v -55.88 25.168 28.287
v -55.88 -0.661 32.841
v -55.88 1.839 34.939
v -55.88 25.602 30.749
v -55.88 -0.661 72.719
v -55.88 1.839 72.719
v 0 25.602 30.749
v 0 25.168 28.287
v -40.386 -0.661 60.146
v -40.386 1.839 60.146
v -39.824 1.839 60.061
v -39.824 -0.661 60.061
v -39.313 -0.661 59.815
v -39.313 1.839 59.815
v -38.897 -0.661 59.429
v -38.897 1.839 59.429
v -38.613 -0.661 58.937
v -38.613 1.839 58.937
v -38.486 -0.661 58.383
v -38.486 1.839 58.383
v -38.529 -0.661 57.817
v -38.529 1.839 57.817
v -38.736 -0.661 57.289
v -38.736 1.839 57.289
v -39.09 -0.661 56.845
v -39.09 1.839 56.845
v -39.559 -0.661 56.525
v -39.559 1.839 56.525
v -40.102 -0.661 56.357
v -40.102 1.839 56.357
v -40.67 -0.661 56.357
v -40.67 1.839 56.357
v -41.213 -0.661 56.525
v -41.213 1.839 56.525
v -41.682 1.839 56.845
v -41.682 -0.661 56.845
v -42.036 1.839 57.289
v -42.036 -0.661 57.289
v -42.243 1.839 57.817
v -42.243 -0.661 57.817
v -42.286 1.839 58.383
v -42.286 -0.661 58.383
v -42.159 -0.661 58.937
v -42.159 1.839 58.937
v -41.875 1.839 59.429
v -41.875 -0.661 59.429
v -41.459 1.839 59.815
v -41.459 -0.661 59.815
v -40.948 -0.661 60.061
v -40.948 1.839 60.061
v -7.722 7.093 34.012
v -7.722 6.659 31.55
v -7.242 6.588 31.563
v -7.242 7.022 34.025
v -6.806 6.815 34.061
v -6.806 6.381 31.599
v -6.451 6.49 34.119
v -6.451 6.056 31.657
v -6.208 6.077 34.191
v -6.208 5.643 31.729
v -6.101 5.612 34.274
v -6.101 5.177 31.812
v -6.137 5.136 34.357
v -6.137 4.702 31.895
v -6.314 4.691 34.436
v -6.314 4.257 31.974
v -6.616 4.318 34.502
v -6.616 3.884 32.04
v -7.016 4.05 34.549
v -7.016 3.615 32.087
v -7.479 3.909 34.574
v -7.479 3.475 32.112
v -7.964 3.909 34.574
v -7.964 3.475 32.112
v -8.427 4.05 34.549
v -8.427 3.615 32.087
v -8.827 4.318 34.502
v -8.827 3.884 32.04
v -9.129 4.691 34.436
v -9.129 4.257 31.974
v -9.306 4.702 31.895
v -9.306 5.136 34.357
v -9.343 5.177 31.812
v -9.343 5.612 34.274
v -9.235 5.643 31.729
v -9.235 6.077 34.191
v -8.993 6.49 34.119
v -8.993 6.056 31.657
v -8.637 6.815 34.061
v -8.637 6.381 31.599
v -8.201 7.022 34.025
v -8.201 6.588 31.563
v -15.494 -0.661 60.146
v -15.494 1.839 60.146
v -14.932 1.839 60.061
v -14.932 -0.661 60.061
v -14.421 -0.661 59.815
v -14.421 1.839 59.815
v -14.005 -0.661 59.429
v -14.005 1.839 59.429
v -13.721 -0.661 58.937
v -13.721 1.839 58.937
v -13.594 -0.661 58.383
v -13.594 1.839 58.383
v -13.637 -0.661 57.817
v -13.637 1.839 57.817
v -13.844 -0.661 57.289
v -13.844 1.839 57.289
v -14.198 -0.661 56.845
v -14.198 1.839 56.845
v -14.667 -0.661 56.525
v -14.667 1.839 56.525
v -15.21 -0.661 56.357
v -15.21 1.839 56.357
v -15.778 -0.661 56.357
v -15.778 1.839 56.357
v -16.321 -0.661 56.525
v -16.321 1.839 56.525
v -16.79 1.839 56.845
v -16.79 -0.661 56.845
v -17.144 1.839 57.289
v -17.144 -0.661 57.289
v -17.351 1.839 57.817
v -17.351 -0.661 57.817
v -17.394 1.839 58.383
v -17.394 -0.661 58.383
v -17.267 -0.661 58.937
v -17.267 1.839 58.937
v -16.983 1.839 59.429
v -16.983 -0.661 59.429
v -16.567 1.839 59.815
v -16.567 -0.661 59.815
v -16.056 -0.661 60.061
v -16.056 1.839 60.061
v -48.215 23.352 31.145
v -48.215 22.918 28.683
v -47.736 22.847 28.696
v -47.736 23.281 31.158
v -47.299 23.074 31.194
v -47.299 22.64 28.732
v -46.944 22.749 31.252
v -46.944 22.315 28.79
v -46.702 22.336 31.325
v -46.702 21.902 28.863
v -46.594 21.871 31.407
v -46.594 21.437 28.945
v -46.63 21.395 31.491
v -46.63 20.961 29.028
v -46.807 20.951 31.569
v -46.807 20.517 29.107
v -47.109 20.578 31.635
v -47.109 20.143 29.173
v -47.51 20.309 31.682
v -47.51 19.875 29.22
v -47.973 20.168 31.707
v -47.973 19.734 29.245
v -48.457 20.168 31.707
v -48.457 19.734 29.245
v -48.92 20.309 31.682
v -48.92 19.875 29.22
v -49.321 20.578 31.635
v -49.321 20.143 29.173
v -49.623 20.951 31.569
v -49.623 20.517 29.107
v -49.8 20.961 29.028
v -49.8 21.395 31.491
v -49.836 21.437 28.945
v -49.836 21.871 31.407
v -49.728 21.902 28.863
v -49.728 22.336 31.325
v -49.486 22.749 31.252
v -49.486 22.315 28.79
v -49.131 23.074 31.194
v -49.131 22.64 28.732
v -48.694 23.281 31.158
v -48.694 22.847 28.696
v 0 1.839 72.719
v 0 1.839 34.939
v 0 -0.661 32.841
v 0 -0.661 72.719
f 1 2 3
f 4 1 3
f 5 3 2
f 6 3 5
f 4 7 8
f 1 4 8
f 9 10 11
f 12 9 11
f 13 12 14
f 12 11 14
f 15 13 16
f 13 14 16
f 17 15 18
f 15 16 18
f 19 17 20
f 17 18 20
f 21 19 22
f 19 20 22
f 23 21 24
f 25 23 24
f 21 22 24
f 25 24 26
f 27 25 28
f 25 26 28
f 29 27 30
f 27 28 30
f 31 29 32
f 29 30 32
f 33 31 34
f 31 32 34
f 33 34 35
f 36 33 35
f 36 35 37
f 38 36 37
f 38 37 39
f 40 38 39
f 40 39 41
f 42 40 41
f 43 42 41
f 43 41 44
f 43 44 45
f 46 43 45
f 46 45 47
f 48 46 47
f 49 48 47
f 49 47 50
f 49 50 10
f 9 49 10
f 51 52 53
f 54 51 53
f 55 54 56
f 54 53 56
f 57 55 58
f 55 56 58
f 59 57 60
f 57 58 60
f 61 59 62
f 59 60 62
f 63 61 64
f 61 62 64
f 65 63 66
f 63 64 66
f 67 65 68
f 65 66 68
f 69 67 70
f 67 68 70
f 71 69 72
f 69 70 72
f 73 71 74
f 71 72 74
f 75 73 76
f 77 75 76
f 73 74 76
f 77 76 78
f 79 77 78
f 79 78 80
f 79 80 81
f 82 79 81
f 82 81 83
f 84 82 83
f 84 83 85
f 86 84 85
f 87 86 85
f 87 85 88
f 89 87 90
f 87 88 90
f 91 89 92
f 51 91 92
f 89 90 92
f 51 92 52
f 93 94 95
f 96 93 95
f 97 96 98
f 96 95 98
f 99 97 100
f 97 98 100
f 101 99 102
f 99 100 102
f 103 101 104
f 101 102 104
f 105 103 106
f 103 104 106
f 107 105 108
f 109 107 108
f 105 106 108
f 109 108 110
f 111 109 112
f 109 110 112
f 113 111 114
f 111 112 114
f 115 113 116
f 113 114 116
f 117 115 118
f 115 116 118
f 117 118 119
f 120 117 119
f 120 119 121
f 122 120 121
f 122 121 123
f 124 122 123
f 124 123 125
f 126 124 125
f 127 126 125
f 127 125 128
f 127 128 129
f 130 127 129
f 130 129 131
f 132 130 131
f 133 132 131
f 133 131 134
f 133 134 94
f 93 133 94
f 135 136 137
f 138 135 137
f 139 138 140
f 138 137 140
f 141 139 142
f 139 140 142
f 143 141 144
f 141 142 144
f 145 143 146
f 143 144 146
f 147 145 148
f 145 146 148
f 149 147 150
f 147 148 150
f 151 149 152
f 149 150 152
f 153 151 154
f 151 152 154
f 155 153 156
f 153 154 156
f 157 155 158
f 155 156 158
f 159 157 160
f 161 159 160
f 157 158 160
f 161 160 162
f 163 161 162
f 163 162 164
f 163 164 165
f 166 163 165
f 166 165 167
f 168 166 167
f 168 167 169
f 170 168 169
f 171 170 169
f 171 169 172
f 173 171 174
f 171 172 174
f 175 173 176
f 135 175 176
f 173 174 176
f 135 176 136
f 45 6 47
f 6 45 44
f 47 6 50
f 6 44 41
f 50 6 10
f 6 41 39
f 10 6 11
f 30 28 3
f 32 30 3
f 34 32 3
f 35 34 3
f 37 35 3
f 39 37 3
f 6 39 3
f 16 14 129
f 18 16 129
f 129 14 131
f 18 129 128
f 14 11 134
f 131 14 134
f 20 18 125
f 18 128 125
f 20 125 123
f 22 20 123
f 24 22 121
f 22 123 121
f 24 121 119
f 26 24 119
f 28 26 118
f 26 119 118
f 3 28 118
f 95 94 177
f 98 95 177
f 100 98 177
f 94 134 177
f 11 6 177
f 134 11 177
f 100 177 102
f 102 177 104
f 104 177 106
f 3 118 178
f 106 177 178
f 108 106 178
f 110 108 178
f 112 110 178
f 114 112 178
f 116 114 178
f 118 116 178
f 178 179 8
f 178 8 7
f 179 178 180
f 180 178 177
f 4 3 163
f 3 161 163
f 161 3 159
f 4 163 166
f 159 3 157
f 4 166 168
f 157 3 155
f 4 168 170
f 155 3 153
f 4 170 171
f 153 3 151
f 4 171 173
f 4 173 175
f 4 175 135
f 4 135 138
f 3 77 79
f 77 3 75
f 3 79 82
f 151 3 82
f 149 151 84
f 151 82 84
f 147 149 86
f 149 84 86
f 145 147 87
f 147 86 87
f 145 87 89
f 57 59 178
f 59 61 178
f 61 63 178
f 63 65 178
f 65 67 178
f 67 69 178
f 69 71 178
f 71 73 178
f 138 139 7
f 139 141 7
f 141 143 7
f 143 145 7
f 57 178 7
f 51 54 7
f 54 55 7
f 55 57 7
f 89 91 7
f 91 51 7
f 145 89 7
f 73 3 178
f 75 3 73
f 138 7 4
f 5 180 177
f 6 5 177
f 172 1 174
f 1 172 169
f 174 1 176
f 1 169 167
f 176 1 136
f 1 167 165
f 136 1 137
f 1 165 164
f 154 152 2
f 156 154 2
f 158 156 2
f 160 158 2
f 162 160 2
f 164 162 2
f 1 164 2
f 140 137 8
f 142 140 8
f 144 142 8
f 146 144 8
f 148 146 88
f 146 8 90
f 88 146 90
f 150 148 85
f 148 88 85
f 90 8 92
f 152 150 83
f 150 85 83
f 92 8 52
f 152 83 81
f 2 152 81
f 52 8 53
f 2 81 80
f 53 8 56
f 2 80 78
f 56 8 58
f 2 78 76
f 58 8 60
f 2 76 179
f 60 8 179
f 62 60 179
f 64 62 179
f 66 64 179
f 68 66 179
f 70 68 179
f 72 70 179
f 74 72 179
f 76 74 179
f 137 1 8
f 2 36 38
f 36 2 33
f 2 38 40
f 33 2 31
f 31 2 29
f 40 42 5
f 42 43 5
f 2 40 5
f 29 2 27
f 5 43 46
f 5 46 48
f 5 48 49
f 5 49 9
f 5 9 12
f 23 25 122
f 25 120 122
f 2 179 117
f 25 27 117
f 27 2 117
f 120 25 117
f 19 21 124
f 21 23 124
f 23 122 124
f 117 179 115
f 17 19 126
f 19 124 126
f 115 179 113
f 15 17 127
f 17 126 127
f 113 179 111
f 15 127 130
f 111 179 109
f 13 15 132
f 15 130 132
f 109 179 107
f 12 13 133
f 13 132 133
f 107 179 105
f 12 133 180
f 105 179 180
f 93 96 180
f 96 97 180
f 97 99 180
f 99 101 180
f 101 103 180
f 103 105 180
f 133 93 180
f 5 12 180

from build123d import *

# Parameters (mm, degrees)
BOSS_EXTRUDE1_DEPTH = 55.88
SKETCH4_R           = 1.905
CUT_EXTRUDE1_DEPTH  = 42.418
SKETCH5_R           = 1.6256
CUT_EXTRUDE2_DEPTH  = 2.5


with BuildPart() as part:
    # Sketch3 → Boss-Extrude1 (new body)
    with BuildSketch(Plane(origin=(0, 0, 0), x_dir=(0, 0, -1), z_dir=(1, 0, 0))):
        Polygon((-72.719013739, -0.661158353), (-72.719013739, 1.838841647), (-34.938762817, 1.838841647), (-30.74863229, 25.602252727), (-28.286612908, 25.168132283), (-32.841013739, -0.661158353), align=None)
    extrude(amount=-BOSS_EXTRUDE1_DEPTH)

    # Sketch4 → Cut-Extrude1 (cut)
    with BuildSketch(Plane(origin=(0, 1.838841647, 0), x_dir=(1, 0, 0), z_dir=(0, 1, 0))):
        with Locations(Location((-40.386, -58.241013739, 0), (0, 0, 270))):
            Circle(SKETCH4_R)
        with Locations(Location((-15.494, -58.241013739, 0), (0, 0, 270))):
            Circle(SKETCH4_R)
    extrude(amount=-CUT_EXTRUDE1_DEPTH, mode=Mode.SUBTRACT)

    # Sketch5 → Cut-Extrude2 (cut)
    with BuildSketch(Plane(origin=(0, 5.596207749, 31.737671267), x_dir=(-1, 0, 0), z_dir=(0, -0.17364817766692642, -0.9848077530122088))):
        with Locations(Location((48.214905279, 15.963281142, 0), (0, 0, 90))):
            Circle(SKETCH5_R)
        with Locations(Location((7.7216, -0.546718858, 0), (0, 0, 90))):
            Circle(SKETCH5_R)
    extrude(amount=-CUT_EXTRUDE2_DEPTH, mode=Mode.SUBTRACT)


solid = part.part
